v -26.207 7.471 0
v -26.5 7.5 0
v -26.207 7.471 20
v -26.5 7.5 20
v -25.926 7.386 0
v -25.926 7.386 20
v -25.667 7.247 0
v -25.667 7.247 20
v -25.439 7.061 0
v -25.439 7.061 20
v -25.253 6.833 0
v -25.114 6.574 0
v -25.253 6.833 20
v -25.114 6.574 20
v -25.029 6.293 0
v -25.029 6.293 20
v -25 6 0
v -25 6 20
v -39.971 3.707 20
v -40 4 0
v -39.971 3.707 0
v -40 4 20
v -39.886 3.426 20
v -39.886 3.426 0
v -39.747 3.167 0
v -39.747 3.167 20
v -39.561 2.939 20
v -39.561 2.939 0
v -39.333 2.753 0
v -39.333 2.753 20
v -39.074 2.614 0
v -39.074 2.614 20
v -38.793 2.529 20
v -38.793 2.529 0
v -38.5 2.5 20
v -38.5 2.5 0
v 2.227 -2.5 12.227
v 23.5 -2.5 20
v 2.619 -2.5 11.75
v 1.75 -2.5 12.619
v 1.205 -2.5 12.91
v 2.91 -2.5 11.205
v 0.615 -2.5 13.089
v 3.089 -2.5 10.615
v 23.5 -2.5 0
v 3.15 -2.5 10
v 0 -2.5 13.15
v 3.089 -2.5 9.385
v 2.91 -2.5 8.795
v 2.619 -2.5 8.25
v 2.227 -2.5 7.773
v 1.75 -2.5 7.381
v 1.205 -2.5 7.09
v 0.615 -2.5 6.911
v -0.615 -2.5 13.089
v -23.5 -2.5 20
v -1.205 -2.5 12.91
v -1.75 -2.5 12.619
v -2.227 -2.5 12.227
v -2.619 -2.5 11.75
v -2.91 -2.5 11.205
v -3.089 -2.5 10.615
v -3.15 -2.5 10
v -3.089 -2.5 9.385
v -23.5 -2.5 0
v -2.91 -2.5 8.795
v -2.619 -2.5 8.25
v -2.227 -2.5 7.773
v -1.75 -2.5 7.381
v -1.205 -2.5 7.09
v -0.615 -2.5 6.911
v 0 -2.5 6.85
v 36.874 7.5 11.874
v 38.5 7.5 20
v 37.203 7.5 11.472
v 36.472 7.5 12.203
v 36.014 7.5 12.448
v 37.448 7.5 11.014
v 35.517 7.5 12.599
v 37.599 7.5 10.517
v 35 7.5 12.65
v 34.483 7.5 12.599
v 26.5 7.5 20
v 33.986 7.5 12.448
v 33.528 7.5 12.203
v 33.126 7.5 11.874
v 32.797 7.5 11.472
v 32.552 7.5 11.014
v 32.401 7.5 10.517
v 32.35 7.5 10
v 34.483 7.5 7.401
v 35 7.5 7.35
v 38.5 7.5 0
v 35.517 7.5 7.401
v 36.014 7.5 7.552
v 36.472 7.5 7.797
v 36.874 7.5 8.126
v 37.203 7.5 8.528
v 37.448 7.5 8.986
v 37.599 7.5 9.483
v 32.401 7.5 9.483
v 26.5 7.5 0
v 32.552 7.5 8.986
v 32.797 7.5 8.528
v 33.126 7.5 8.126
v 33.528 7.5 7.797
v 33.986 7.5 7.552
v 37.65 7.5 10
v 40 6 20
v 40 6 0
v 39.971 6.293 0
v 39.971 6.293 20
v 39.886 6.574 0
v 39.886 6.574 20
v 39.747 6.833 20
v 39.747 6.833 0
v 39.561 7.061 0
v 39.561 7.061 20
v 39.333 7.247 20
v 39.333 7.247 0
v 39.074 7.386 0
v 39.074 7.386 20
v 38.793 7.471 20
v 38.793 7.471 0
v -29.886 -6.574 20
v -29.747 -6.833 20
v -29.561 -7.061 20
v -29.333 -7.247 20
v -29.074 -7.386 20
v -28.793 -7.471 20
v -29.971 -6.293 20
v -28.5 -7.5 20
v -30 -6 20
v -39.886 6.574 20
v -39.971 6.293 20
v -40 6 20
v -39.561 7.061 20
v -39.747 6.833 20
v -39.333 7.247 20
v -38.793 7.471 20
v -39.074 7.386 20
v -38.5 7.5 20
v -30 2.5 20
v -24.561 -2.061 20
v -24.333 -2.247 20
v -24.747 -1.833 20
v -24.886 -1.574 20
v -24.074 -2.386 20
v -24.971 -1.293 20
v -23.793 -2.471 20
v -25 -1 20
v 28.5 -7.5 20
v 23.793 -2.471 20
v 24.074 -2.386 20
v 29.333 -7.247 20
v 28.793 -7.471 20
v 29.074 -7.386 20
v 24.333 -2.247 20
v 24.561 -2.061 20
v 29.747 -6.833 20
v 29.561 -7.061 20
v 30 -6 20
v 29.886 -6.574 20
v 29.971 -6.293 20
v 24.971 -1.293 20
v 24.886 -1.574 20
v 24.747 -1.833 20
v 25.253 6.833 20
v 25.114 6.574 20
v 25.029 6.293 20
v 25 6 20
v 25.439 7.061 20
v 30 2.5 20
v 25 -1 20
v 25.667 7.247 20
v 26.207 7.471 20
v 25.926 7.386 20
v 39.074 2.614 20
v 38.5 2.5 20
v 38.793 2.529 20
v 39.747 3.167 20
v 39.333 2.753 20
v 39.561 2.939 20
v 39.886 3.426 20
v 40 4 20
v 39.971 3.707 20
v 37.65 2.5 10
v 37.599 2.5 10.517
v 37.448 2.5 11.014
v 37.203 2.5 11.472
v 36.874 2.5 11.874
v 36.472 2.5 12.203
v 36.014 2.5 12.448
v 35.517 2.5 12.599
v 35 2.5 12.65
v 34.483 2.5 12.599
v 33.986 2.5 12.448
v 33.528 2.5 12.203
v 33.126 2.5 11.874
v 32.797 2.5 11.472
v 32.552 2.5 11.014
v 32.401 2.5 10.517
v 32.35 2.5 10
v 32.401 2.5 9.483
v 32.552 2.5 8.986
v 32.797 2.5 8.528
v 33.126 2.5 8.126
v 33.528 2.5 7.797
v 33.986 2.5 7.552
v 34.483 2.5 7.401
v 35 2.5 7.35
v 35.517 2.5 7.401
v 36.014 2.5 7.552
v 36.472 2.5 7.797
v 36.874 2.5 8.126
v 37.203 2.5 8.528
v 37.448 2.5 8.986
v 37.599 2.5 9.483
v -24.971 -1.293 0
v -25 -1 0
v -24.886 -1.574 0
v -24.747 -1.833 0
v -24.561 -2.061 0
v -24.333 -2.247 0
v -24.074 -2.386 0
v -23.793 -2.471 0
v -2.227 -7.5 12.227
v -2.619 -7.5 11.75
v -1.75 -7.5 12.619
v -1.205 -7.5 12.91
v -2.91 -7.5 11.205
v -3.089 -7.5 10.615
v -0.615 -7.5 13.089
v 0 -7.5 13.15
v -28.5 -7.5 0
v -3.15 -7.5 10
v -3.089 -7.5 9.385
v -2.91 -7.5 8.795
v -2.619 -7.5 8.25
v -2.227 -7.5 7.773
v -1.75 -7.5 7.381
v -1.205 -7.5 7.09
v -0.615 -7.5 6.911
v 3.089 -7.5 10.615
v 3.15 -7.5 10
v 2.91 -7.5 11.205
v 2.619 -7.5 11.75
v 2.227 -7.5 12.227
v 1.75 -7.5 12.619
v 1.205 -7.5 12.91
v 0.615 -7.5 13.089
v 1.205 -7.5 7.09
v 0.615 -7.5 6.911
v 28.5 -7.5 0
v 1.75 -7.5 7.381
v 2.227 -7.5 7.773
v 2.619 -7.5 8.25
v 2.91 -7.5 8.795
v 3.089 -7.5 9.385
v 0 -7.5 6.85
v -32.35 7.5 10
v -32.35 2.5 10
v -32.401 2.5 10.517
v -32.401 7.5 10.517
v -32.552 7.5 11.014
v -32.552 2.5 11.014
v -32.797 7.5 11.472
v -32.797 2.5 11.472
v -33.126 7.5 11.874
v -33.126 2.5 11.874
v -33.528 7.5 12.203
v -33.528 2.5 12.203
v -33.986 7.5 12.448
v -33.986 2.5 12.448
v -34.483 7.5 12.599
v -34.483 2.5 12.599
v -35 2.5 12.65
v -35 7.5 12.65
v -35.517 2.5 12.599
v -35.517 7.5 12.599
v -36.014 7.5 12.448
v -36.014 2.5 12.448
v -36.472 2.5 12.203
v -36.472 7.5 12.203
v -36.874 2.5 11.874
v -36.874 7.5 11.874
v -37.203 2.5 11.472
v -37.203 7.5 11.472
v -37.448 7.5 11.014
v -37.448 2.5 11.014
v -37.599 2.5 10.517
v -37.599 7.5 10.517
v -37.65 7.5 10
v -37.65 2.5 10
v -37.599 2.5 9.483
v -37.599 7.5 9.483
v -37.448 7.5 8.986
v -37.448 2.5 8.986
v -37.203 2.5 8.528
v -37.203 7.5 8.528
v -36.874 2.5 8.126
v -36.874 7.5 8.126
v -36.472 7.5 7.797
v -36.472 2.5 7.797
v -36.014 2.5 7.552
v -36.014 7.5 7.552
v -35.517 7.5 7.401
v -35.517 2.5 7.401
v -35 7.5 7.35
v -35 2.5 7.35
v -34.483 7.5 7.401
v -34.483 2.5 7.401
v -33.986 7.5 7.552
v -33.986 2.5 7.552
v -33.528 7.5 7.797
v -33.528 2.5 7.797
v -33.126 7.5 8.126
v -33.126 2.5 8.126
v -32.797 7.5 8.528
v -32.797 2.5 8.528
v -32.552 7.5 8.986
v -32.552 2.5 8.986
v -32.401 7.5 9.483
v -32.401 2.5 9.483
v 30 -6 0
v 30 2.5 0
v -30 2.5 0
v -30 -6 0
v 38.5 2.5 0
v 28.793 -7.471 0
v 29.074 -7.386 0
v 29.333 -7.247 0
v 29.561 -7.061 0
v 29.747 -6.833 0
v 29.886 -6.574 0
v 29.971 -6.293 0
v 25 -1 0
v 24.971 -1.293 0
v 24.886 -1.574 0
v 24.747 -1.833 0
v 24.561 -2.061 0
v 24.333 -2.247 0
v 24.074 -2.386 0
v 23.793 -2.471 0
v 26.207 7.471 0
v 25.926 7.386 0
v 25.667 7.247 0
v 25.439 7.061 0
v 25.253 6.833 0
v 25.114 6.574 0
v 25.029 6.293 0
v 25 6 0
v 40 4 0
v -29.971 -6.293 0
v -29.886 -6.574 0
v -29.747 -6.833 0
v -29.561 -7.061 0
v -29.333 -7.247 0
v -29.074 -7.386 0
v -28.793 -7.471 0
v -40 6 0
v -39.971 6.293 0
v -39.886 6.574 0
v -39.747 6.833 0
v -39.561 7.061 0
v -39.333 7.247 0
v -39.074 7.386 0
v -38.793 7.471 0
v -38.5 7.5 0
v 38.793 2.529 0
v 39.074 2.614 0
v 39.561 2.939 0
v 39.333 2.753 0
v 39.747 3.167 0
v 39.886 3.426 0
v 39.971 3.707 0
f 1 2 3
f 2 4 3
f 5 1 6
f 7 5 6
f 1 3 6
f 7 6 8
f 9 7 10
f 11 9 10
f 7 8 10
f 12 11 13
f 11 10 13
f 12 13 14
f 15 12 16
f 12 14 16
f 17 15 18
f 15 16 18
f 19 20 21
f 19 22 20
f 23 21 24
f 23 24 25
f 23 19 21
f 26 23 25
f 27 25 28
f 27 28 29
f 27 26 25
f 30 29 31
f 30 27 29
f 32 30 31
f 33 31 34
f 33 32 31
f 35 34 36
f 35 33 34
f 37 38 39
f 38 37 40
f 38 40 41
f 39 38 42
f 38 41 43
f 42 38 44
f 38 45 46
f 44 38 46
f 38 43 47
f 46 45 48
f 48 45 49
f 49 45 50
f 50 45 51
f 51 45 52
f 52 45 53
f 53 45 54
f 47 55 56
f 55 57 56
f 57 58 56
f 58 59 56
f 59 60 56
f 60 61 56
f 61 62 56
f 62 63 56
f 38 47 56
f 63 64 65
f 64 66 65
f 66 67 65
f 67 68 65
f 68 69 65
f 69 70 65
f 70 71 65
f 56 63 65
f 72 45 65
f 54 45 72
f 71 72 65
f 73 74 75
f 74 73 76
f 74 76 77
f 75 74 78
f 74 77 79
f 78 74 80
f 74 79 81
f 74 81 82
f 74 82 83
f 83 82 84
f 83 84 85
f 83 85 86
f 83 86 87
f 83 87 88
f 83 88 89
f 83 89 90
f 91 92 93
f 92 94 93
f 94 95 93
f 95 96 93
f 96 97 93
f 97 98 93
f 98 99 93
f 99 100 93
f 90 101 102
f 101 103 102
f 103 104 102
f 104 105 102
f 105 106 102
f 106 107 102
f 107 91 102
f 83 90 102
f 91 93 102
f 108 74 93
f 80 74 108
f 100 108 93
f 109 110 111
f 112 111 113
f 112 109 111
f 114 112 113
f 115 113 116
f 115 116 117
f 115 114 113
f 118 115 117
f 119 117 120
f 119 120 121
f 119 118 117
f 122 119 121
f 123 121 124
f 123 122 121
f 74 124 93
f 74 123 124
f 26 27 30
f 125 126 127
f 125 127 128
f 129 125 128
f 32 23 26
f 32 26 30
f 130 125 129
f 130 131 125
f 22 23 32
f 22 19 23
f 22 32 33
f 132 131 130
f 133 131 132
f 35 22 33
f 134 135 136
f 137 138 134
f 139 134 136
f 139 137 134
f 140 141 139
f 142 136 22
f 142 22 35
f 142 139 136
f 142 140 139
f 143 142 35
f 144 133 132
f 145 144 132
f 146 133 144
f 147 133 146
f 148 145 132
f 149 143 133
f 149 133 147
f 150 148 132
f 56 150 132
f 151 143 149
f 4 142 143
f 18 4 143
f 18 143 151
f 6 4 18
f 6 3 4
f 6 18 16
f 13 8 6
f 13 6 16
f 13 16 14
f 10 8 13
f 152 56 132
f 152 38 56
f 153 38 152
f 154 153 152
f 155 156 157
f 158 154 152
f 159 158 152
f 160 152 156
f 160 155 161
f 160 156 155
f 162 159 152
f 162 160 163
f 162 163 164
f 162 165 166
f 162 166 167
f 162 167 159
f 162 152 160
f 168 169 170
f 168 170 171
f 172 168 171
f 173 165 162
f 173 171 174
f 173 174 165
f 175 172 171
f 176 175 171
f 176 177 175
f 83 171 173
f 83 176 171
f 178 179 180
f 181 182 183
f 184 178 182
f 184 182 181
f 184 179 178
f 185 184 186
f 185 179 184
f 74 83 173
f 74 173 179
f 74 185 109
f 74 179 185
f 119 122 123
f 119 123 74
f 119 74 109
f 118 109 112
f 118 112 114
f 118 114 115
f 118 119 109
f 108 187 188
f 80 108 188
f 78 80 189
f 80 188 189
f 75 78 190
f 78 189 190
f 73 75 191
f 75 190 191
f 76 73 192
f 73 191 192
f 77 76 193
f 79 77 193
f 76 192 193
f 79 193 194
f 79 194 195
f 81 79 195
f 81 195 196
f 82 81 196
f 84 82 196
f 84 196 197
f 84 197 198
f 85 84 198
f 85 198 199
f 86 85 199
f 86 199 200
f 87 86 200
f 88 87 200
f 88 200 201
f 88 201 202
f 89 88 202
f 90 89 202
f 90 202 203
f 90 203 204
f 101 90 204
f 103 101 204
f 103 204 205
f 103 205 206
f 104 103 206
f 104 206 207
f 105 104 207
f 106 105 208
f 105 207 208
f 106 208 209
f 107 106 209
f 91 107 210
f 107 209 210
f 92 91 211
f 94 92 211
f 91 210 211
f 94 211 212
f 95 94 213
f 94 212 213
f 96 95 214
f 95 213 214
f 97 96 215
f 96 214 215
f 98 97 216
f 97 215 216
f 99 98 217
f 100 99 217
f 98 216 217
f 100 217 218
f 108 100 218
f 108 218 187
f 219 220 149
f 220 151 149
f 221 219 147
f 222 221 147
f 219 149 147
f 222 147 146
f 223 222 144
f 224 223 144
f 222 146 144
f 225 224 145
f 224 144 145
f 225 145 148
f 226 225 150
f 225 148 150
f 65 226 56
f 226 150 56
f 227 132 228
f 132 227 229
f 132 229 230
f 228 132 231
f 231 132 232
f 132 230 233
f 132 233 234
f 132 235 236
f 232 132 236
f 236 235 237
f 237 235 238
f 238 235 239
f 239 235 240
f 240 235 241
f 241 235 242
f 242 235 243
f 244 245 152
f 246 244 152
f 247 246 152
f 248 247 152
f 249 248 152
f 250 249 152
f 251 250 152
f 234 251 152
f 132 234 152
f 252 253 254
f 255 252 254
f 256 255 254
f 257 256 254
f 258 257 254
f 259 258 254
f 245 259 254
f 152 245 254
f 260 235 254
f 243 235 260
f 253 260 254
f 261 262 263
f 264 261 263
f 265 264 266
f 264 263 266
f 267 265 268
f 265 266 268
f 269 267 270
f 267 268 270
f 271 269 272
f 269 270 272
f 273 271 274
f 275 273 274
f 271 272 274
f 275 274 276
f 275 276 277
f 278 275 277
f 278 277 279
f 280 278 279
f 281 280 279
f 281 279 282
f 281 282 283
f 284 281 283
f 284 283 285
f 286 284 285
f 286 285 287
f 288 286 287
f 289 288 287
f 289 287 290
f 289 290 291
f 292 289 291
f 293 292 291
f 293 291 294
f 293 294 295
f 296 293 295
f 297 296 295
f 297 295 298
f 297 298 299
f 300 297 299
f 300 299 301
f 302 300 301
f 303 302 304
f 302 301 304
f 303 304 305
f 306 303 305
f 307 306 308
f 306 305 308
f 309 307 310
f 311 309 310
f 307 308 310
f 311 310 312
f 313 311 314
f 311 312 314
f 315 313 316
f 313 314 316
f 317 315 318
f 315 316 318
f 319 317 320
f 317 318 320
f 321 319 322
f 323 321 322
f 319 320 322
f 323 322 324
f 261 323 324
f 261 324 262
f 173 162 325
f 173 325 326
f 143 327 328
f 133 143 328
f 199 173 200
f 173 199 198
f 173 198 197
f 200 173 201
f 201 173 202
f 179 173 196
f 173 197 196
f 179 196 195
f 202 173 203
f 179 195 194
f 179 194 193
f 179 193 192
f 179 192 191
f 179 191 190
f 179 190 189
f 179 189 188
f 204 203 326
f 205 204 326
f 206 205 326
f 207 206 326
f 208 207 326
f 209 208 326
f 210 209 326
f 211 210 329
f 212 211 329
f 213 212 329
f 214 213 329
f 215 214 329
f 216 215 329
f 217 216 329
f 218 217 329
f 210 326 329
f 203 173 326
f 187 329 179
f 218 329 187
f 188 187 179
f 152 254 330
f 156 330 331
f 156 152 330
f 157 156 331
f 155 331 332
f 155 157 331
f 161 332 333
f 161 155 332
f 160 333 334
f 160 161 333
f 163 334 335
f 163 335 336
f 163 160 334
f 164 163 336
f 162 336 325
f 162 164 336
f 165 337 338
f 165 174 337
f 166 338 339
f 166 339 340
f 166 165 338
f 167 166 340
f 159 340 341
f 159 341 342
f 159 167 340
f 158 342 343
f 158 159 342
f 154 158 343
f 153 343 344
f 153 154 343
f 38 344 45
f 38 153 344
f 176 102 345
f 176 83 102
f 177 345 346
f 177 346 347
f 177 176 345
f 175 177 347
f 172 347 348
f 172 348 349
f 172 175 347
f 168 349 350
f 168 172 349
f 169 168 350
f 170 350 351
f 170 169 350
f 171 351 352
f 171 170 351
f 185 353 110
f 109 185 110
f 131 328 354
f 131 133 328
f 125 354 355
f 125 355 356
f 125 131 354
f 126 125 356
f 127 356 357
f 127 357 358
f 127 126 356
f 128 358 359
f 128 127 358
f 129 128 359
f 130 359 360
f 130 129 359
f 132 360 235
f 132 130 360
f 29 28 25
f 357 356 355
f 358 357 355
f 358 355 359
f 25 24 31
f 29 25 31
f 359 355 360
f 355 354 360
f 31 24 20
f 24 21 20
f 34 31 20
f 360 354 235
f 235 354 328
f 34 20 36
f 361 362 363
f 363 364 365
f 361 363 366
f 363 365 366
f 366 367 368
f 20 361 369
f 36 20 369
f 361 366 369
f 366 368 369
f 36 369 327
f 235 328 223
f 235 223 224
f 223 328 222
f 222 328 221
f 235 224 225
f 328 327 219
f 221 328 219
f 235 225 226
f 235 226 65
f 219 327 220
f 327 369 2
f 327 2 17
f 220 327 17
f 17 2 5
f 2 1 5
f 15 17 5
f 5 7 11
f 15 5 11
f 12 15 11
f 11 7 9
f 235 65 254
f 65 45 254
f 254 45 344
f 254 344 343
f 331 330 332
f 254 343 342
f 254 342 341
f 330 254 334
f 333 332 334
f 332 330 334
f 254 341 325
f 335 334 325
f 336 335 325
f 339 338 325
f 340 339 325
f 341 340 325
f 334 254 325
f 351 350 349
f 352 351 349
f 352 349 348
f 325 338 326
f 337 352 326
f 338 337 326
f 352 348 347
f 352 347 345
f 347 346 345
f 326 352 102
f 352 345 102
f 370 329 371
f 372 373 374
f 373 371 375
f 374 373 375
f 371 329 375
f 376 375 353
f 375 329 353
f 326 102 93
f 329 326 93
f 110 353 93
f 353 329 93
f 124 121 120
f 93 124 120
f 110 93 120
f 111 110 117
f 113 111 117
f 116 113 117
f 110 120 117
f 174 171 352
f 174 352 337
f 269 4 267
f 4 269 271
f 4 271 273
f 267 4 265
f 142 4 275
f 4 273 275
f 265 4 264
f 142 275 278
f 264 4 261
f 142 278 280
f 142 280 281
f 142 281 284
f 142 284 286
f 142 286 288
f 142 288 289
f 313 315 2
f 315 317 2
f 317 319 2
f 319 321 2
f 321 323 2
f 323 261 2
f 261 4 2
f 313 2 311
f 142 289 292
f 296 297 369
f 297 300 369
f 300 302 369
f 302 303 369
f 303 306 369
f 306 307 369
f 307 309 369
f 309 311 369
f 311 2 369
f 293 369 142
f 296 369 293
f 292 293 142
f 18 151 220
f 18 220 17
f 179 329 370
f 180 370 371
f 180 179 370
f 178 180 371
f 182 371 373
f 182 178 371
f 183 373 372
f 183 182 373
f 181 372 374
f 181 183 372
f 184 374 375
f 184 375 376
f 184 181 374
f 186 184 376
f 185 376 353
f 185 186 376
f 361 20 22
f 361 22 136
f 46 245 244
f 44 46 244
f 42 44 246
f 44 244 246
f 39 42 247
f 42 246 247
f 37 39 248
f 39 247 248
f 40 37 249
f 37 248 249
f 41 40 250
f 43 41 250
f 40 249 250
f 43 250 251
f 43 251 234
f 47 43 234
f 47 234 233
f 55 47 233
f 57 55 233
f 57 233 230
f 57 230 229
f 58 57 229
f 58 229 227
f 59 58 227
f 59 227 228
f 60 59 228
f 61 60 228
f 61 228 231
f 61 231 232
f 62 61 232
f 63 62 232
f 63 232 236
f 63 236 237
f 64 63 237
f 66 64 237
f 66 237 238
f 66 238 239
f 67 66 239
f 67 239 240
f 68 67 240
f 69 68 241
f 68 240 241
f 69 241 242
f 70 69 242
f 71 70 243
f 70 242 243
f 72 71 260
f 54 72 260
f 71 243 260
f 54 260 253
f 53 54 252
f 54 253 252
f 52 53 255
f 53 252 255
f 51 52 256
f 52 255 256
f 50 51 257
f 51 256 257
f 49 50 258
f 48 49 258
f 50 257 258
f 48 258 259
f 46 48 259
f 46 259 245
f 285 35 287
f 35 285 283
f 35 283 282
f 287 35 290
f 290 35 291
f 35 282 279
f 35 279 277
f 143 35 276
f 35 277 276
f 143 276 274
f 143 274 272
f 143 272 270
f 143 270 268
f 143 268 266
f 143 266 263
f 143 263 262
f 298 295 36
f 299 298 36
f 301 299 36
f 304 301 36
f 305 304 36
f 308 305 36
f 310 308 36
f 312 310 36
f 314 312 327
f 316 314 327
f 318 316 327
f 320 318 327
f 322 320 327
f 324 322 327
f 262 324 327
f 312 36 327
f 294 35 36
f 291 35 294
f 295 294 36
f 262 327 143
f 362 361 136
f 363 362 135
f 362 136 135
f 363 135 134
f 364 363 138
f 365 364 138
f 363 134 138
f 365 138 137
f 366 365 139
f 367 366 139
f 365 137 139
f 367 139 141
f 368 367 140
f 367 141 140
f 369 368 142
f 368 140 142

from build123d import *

# Parameters (mm, degrees)
F0_W     = 10
F0_H     = 5
F1_DEPTH = 20
F2_R     = 3.15
F3_DEPTH = 25
F4_R     = 2.65
F5_DEPTH = 25
F6_R     = 1.5


with BuildPart() as f1:
    # F0 (on Top) → F1 (new body)
    with BuildSketch(Plane.XY):
        with Locations((-35, 5)):
            Rectangle(F0_W, F0_H)
        Polygon((30, 2.5), (30, 7.5), (25, 7.5), (25, -2.5), (-25, -2.5), (-25, 7.5), (-30, 7.5), (-30, 2.5), (-30, -7.5), (30, -7.5), align=None)
        with Locations((35, 5)):
            Rectangle(F0_W, F0_H)
    extrude(amount=F1_DEPTH)

    # F2 (on face) → F3 (cut)
    with BuildSketch(Plane.XZ.offset(7.5)):
        with Locations((0, 10)):
            Circle(F2_R)
    extrude(amount=-F3_DEPTH, mode=Mode.SUBTRACT)

    # F4 (on face) → F5 (cut)
    with BuildSketch(Plane.XZ.offset(-2.5)):
        with Locations((-35, 10)):
            Circle(F4_R)
        with Locations((35, 10)):
            Circle(F4_R)
    extrude(amount=-F5_DEPTH, mode=Mode.SUBTRACT)

    # F6
    f6_edges = [f1.edges().sort_by_distance(p)[0] for p in [
        (-25, -2.5, 10),
        (25, -2.5, 10),
        (40, 7.5, 10),
        (40, 2.5, 10),
        (30, -7.5, 10),
        (-30, -7.5, 10),
        (-40, 2.5, 10),
        (-40, 7.5, 10),
        (-25, 7.5, 10),
        (25, 7.5, 10),
    ]]
    fillet(f6_edges, radius=F6_R)


solid = f1.part
